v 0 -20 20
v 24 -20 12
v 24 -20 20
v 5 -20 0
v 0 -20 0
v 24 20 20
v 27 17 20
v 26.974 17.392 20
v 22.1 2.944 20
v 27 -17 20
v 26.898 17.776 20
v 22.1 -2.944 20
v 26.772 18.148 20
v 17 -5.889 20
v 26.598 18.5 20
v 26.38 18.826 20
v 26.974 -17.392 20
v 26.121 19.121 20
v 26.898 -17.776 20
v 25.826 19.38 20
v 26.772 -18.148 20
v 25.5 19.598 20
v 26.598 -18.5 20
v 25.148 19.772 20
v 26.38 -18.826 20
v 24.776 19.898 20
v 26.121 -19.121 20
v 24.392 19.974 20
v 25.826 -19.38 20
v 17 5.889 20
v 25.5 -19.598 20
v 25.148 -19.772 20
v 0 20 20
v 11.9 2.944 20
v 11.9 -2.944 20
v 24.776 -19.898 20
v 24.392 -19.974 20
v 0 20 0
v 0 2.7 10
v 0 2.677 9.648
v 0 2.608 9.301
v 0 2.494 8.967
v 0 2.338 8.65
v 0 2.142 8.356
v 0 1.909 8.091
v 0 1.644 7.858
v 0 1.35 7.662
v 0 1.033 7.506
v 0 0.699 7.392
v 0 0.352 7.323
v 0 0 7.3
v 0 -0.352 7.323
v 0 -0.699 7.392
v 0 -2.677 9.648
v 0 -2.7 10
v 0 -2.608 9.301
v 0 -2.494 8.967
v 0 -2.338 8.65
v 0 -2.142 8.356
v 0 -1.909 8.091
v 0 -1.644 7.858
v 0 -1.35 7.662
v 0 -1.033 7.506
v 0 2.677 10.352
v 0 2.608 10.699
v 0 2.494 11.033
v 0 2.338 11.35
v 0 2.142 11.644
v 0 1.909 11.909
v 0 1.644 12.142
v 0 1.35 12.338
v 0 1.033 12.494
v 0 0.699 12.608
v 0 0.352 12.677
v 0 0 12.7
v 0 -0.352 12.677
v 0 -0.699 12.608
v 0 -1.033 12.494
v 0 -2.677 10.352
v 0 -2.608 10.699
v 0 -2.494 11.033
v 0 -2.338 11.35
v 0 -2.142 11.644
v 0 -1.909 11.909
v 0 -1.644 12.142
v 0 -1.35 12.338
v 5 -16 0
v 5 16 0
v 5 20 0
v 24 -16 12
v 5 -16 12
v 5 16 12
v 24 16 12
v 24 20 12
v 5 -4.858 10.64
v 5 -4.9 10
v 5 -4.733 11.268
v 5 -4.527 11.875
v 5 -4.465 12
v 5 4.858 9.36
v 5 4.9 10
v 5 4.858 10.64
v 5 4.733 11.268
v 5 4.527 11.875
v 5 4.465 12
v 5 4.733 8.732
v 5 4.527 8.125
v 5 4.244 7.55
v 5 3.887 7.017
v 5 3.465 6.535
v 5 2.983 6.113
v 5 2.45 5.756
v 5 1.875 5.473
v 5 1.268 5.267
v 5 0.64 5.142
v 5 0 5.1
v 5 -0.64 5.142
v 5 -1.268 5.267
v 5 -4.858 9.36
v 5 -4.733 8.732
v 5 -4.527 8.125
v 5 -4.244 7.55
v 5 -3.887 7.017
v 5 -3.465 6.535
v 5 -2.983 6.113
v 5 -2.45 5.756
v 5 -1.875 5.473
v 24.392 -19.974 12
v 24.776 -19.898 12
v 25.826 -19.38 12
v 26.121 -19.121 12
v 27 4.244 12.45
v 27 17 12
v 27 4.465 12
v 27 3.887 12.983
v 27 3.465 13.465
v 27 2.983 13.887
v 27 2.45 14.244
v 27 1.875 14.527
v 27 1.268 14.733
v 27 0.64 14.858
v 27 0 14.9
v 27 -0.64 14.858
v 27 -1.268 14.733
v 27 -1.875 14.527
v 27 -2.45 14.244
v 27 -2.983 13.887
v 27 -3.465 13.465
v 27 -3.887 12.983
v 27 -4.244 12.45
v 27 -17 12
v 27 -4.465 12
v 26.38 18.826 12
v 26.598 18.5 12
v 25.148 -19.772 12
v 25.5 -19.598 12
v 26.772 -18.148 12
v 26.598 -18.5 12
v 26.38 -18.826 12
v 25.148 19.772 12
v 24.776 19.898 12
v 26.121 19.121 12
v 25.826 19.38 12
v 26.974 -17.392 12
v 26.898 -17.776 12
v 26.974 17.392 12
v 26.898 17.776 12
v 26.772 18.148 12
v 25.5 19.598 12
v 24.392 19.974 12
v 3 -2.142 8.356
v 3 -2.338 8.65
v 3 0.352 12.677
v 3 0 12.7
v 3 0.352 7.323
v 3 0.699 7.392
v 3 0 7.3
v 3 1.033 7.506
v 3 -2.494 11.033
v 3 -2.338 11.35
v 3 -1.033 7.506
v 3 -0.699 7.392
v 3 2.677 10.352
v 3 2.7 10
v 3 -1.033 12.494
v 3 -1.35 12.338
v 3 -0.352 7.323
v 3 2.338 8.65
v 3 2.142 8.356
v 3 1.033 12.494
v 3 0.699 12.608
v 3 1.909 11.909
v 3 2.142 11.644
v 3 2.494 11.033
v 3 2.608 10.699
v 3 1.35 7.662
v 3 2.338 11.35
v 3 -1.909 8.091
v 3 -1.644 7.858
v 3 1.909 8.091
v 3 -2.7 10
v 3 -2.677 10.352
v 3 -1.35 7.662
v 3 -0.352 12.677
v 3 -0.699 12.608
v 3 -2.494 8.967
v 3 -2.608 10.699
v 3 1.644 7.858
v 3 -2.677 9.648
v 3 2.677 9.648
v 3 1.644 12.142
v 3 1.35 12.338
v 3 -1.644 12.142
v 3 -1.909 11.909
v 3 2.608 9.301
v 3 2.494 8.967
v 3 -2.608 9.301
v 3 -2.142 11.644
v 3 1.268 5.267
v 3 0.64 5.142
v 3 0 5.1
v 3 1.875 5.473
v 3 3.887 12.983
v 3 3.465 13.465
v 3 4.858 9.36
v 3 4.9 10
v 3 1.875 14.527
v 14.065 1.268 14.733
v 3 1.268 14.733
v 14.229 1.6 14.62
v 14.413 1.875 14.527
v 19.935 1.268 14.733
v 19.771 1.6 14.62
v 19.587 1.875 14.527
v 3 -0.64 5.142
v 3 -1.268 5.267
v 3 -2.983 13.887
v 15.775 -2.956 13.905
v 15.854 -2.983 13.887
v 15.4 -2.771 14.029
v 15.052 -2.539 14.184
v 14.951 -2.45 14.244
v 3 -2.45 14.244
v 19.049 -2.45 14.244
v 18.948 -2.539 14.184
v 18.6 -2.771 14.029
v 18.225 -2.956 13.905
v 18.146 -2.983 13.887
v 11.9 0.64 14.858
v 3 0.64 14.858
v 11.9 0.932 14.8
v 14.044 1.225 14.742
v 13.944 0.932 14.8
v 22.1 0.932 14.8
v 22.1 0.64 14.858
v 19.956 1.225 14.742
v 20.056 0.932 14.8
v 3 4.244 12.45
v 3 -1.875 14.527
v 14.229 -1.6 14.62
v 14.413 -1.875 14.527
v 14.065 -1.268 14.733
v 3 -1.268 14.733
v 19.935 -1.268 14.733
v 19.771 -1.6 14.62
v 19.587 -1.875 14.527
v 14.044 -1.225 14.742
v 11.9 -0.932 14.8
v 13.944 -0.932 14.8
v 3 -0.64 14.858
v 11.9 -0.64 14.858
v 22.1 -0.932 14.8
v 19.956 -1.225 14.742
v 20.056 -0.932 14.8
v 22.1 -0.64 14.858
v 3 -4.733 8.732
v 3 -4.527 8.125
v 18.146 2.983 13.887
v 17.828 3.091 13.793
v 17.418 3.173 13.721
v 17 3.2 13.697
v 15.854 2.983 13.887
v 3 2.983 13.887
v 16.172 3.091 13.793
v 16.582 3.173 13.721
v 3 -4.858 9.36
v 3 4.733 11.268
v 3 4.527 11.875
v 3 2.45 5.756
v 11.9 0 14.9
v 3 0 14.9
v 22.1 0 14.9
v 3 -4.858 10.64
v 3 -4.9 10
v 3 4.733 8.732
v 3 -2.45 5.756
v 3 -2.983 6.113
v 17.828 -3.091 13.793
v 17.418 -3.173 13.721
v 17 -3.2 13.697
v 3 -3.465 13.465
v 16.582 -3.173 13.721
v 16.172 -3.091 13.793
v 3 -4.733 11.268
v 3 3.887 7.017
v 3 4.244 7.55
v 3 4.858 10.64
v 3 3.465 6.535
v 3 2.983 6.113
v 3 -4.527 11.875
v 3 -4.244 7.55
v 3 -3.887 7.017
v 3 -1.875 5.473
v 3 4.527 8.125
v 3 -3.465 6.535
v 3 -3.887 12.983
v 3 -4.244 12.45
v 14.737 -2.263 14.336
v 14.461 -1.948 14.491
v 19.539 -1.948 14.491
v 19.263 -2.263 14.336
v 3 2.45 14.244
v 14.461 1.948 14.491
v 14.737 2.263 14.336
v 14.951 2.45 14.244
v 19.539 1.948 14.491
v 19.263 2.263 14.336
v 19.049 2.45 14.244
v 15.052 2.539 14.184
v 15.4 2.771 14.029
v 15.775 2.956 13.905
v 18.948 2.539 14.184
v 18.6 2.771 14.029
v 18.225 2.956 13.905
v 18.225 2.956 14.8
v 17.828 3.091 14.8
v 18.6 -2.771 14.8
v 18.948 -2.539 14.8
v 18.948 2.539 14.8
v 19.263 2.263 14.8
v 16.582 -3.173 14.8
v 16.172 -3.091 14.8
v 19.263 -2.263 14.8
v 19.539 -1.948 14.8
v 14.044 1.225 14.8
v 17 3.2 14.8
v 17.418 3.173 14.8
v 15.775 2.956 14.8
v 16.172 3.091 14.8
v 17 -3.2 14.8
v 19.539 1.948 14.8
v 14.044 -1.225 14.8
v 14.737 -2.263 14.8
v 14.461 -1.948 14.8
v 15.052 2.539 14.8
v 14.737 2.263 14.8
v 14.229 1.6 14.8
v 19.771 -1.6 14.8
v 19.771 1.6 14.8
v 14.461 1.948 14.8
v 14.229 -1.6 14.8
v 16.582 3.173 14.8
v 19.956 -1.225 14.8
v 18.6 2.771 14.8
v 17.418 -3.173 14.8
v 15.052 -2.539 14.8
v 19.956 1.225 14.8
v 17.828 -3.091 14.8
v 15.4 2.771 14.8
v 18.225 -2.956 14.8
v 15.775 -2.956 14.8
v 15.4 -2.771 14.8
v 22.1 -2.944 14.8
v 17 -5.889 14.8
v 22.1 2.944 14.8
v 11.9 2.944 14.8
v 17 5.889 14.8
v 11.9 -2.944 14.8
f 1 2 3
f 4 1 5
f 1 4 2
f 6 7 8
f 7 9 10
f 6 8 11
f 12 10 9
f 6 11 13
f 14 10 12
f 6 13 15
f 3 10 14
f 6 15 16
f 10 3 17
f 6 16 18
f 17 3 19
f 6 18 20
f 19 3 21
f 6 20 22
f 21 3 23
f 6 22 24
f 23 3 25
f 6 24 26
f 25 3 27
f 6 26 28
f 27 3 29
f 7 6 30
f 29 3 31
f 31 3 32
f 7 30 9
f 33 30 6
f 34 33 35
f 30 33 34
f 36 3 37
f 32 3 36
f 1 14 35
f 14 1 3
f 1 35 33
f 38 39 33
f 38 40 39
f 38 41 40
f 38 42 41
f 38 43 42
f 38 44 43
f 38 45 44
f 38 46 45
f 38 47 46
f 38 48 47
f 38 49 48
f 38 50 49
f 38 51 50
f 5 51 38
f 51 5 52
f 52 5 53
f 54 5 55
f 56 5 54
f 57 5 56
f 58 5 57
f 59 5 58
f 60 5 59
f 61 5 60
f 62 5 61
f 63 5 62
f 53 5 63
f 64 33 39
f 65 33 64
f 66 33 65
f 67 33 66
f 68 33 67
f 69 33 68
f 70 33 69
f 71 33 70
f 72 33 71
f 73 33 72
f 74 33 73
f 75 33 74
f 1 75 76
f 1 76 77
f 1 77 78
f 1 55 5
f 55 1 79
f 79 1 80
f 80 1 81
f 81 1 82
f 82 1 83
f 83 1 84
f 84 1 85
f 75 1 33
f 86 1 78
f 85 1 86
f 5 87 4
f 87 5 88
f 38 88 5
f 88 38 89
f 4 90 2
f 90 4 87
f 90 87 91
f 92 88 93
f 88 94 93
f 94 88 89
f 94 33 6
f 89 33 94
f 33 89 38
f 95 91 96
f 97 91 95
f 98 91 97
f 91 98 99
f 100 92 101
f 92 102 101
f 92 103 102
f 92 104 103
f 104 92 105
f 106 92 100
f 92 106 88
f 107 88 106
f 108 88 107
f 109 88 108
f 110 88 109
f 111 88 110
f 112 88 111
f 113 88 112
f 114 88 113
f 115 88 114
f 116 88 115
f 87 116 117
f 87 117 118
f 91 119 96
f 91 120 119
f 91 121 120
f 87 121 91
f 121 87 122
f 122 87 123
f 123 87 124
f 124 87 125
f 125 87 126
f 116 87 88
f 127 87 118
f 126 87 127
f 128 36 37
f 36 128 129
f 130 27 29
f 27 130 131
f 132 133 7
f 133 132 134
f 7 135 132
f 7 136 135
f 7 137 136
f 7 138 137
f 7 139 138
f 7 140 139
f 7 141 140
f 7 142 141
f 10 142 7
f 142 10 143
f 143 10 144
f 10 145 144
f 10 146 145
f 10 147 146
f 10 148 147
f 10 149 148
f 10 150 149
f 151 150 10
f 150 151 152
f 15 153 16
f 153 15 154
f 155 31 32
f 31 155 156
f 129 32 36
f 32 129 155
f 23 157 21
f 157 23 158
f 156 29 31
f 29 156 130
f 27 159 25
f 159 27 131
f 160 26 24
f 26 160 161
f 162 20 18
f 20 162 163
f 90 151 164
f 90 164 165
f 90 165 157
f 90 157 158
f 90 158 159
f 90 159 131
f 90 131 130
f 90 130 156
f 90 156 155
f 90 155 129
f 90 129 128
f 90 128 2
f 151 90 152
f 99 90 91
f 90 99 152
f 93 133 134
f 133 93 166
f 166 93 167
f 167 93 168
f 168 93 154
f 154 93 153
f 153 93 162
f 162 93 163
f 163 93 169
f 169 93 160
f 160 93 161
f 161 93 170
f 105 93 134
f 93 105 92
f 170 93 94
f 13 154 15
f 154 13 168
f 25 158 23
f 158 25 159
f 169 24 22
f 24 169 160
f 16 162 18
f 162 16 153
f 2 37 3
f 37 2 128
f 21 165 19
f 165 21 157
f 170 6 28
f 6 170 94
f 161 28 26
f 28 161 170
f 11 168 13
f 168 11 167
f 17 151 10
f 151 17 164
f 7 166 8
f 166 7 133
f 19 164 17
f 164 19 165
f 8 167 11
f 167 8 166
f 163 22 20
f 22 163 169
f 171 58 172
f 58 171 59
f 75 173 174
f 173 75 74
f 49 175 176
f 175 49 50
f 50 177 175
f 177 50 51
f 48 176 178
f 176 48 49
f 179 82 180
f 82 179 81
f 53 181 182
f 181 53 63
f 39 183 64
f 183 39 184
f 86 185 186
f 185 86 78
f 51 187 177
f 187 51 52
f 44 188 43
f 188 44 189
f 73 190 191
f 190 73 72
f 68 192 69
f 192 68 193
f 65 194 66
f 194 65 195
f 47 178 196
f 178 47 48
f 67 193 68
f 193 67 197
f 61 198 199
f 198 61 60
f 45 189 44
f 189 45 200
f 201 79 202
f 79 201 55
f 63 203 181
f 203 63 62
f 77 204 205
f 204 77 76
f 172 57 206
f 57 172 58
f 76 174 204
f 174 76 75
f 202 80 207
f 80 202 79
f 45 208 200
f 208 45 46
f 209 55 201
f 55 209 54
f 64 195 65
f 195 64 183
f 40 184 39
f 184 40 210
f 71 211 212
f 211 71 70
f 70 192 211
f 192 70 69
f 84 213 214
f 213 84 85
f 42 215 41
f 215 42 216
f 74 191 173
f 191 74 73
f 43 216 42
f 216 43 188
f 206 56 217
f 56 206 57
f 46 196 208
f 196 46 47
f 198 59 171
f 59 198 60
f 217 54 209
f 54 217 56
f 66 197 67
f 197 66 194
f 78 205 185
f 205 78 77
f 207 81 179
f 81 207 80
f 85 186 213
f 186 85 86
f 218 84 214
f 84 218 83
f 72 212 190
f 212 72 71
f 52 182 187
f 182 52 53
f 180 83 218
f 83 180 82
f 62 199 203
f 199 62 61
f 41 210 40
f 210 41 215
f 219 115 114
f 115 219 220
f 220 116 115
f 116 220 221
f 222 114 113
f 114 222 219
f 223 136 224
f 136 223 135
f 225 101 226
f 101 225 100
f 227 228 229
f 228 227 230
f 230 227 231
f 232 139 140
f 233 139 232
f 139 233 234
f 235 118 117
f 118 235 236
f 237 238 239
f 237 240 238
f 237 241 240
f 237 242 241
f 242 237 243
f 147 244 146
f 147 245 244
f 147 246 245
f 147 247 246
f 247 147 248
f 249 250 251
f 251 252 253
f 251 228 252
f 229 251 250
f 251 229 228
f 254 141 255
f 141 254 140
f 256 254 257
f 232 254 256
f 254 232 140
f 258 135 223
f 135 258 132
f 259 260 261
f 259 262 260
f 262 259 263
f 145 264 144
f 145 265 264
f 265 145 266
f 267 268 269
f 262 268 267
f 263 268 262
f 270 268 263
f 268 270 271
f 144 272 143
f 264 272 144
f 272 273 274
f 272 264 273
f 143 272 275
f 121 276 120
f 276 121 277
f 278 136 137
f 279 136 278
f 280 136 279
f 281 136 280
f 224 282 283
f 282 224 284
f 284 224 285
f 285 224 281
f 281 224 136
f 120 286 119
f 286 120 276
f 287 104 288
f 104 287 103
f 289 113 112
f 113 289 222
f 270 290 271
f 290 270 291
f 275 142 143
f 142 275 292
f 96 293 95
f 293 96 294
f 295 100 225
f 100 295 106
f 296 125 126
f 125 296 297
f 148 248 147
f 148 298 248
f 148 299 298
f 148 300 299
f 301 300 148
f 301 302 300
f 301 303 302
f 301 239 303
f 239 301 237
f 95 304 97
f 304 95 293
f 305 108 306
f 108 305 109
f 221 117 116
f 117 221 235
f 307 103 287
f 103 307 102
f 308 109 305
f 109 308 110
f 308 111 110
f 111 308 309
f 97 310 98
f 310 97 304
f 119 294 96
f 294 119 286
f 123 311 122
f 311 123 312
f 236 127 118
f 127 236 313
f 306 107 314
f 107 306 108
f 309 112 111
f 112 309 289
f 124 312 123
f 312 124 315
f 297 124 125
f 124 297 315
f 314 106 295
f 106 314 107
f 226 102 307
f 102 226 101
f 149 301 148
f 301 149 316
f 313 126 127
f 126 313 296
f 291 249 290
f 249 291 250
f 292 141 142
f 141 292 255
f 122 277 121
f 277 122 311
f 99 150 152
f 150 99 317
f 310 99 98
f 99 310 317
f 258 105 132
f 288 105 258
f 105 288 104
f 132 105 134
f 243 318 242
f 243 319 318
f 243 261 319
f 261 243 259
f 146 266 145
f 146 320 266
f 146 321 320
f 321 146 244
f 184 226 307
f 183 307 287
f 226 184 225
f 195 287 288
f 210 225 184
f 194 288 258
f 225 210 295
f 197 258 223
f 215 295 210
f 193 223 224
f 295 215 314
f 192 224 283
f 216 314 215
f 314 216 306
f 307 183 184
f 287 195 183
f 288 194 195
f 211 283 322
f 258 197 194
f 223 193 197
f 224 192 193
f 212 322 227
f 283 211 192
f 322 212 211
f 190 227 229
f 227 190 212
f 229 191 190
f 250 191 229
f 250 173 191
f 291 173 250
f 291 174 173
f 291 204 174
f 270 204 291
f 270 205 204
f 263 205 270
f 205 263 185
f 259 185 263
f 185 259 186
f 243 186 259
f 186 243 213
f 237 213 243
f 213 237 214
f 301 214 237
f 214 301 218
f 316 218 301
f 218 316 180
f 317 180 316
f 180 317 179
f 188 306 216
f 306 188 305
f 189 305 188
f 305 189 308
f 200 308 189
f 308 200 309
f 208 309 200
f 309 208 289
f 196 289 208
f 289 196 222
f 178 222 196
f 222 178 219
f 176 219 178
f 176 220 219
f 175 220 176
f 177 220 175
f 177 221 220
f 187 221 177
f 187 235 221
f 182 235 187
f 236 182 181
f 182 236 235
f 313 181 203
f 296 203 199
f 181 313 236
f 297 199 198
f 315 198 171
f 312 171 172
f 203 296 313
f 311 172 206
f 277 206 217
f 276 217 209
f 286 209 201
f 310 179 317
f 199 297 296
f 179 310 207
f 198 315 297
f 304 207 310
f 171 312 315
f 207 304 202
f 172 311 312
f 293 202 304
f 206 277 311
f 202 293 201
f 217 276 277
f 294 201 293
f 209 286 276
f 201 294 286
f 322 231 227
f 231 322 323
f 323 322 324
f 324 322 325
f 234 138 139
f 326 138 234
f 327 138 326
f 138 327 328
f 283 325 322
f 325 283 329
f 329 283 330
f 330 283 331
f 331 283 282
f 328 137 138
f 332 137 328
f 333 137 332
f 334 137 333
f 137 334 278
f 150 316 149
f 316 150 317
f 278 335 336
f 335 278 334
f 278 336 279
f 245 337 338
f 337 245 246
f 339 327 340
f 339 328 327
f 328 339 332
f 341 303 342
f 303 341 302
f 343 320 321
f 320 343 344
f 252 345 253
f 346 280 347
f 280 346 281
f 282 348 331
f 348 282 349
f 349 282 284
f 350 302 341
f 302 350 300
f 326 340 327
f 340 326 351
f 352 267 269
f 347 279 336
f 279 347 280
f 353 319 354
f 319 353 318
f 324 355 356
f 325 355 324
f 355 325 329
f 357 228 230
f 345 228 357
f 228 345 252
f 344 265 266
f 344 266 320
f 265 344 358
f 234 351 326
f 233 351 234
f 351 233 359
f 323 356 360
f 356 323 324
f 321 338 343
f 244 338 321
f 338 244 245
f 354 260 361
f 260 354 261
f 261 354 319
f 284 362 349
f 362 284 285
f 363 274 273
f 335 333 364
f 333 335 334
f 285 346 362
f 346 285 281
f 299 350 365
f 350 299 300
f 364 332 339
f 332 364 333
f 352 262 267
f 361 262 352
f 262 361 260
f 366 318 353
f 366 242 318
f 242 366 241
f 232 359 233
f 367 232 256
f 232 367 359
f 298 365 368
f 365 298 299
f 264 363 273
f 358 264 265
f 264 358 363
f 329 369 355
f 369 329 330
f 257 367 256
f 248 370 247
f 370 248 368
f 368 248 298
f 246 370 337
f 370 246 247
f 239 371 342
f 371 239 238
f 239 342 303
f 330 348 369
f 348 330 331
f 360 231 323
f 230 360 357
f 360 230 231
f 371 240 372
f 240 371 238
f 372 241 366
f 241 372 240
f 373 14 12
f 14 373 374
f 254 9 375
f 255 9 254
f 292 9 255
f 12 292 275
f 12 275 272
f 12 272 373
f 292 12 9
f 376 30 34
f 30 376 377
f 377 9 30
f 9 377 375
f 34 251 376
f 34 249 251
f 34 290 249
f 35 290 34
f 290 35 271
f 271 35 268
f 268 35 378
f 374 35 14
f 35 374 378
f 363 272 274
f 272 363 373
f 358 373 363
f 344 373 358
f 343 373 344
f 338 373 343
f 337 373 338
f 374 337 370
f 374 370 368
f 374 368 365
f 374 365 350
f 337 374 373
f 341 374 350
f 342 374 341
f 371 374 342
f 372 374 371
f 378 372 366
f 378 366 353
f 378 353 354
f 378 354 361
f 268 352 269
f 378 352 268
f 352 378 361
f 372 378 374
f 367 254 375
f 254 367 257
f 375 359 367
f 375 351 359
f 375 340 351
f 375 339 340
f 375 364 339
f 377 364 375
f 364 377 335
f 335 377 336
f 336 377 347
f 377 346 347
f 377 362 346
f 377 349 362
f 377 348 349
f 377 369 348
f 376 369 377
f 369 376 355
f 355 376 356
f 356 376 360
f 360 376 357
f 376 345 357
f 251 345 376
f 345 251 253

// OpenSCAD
// file: lib/comun.scad
// =====================================================================
// AutoSwapEnder3Pro - parametros y utilidades comunes de las piezas
// Licencia MIT. Unidades: milimetros.
//
// Sistema de coordenadas de la ESTACION (el mismo en todas las piezas que
// se montan en ella):
//   s : a lo largo de la estacion, 0 = HOME del carro, crece hacia la impresora
//   x : a lo ancho, 0 = eje central (riel lineal), +x = lado de la caja de descarga
//   z : vertical, 0 = cara superior de la base de perfiles 2020 ("b" en la guia)
// El plano de transferencia (superficie por la que se deslizan las placas)
// esta en z = PLANO. Se ajusta a la altura de la cama de la impresora con las
// patas niveladoras, NO cambiando estas piezas.
// =====================================================================

$fn = 48;

// ----------------------------------------------------- placas y cama
placa_ancho  = 235;     // placa PEI
placa_largo  = 235;
placa_esp    = 0.6;     // espesor real de tus placas (mide con calibrador; 0.5 a 0.75)
voladizo     = 11;      // cuanto sobresale la placa (o su lengüeta) por delante de la cama

// ----------------------------------------------------- estacion (alturas sobre la base)
PLANO        = 60;      // plano de transferencia sobre la cara superior de la base
RIEL_SUP     = 20;      // cara superior del riel lineal (2020 apoyado en los travesaños)
ZP           = PLANO - RIEL_SUP;  // = 40: plano de transferencia sobre el riel lineal

// zapata (debe coincidir con zapata.scad)
zapata_bajo  = 8;       // cuanto cuelga la zapata por debajo de la placa
zapata_bolsillo = 6;    // profundidad del bolsillo para el dedo (desde abajo)

// cargador (ascensor)
paso_estante = 14;      // distancia vertical entre placas en el cargador
niveles      = 6;       // placas que caben en el cargador

// ----------------------------------------------------- perfil y tornilleria
perfil      = 20;       // perfil de aluminio 2020
ranura_ancho = 6.2;     // boca de la ranura (serie 20)
holgura     = 0.3;      // holgura general de impresion

m2_paso     = 1.8;   // agujero para autorroscante M2 (servos)
m3          = 3.4;   // paso libre M3
m3_rosca    = 2.7;   // para roscar M3 directamente en plastico
m3_tuerca   = 5.7;   // M3: entre caras + holgura
m3_tuerca_h = 2.6;
m3_cabeza   = 6.2;
m4          = 4.4;
m5          = 5.4;   // paso libre M5
m5_cabeza   = 9.2;
m5_tuerca   = 8.2;   // M5: entre caras + holgura

// ruedas en V estandar (Openbuilds "Solid V Wheel" + rodamientos 625)
rueda_d      = 23.9;
rueda_ancho  = 10.2;
rueda_sep    = 39.26;   // distancia entre centros de ruedas a ambos lados de un 2020
excentrica_d = 7.2;     // alojamiento del espaciador excentrico
espaciador_h = 6;       // espaciador (excentrico o fijo) entre rueda y placa

// ----------------------------------------------------- utilidades

// Caja con aristas verticales redondeadas (r) apoyada en z=0.
module caja_r(size, r = 2) {
  r2 = min(r, size[0] / 2 - 0.01, size[1] / 2 - 0.01);
  hull() for (ix = [r2, size[0] - r2], iy = [r2, size[1] - r2])
    translate([ix, iy, 0]) cylinder(r = r2, h = size[2]);
}

// Igual pero centrada en x e y.
module caja_rc(size, r = 2) { translate([-size[0] / 2, -size[1] / 2, 0]) caja_r(size, r); }

// Prisma hexagonal para tuercas (ec = medida entre caras).
module hexagono(ec, h) { cylinder(d = ec / cos(30), h = h, $fn = 6); }

// Ranura (agujero alargado) a lo largo de x.
module ranura(largo, d, h) {
  hull() for (i = [-largo / 2, largo / 2]) translate([i, 0, 0]) cylinder(d = d, h = h);
}

// Taladro M5 con avellanado para la cabeza (para atornillar a un perfil con tuerca en T).
module taladro_m5(h, cabeza = 4) {
  translate([0, 0, -0.1]) cylinder(d = m5, h = h + 0.2);
  translate([0, 0, h - cabeza]) cylinder(d = m5_cabeza + 0.6, h = cabeza + 0.1);
}

// Taladro M3 pasante con alojamiento de tuerca hexagonal por debajo.
module taladro_m3_tuerca(h, prof_tuerca = m3_tuerca_h + 0.2) {
  translate([0, 0, -0.1]) cylinder(d = m3, h = h + 0.2);
  translate([0, 0, -0.1]) hexagono(m3_tuerca, prof_tuerca + 0.1);
}

// Perfil 2020 de referencia (solo para ensamble y comprobaciones visuales).
module perfil2020(largo) {
  difference() {
    translate([-10, -10, 0]) cube([20, 20, largo]);
    for (a = [0, 90, 180, 270]) rotate([0, 0, a])
      translate([10 - 1.8, -ranura_ancho / 2, -1]) cube([2, ranura_ancho, largo + 2]);
    translate([0, 0, -1]) cylinder(d = 4.2, h = largo + 2);
  }
}

// Microinterruptor KW11-3Z con palanca de rodillo (referencia: 20 x 6.4 x 10 mm,
// taladros M2 a 9.5 mm). Agujeros de montaje, con la cara de montaje en z=0.
module taladros_kw11(h = 10) {
  for (i = [-4.75, 4.75]) translate([i, 0, -0.1]) cylinder(d = 2.2, h = h + 0.2);
}
// main file
// =====================================================================
// PIE NIVELADOR LATERAL - en el costado de los largueros (imprimir 6)
// Material: PETG. 4 perimetros, 50 %. Imprimir como sale el STL.
//
// Se atornilla a la ranura LATERAL exterior del perfil 2020 (M5 x 10 + tuerca en
// T) y sostiene una pata niveladora M6 vertical a su lado. Asi la base puede
// quedar desde casi a ras de mesa hasta ~20 mm de altura:
//     altura de la base (h) = A3 + 0.5 - 80 mm
// (A3 = altura de la base magnetica de la cama sobre la mesa, Anexo A).
// Si h sale negativa, pon la impresora sobre una tabla de MDF del grosor que falte.
// =====================================================================
include <lib/comun.scad>

m6_tuerca = 10.2;   // M6: entre caras + holgura
m6_h      = 5.2;
largo     = 40;     // a lo largo del perfil
ala       = 22;     // cuanto sale hacia fuera (la pata M6 va en el centro del ala)

difference() {
  union() {
    // placa que apoya en la cara lateral del perfil (20 mm de alto)
    translate([0, -largo / 2, 0]) cube([5, largo, 20]);
    // ala horizontal arriba, donde rosca la pata
    translate([0, -largo / 2, 12]) caja_r([5 + ala, largo, 8], 3);
    // refuerzos
    for (sy = [-largo / 2, largo / 2 - 4]) hull() {
      translate([0, sy, 0]) cube([5, 4, 20]);
      translate([0, sy, 12]) cube([5 + ala - 3, 4, 8]);
    }
  }
  // M5 a la ranura lateral del perfil (centro a 10 mm de altura)
  translate([-1, 0, 10]) rotate([0, 90, 0]) {
    cylinder(d = m5, h = 8);
    translate([0, 0, 4]) cylinder(d = m5_cabeza + 0.6, h = 30);
  }
  // pata M6 vertical + tuerca atrapada por arriba
  translate([5 + ala / 2 + 1, 0, -1]) cylinder(d = 6.4, h = 30);
  translate([5 + ala / 2 + 1, 0, 20 - m6_h]) rotate([0, 0, 30]) hexagono(m6_tuerca, m6_h + 0.1);
}
